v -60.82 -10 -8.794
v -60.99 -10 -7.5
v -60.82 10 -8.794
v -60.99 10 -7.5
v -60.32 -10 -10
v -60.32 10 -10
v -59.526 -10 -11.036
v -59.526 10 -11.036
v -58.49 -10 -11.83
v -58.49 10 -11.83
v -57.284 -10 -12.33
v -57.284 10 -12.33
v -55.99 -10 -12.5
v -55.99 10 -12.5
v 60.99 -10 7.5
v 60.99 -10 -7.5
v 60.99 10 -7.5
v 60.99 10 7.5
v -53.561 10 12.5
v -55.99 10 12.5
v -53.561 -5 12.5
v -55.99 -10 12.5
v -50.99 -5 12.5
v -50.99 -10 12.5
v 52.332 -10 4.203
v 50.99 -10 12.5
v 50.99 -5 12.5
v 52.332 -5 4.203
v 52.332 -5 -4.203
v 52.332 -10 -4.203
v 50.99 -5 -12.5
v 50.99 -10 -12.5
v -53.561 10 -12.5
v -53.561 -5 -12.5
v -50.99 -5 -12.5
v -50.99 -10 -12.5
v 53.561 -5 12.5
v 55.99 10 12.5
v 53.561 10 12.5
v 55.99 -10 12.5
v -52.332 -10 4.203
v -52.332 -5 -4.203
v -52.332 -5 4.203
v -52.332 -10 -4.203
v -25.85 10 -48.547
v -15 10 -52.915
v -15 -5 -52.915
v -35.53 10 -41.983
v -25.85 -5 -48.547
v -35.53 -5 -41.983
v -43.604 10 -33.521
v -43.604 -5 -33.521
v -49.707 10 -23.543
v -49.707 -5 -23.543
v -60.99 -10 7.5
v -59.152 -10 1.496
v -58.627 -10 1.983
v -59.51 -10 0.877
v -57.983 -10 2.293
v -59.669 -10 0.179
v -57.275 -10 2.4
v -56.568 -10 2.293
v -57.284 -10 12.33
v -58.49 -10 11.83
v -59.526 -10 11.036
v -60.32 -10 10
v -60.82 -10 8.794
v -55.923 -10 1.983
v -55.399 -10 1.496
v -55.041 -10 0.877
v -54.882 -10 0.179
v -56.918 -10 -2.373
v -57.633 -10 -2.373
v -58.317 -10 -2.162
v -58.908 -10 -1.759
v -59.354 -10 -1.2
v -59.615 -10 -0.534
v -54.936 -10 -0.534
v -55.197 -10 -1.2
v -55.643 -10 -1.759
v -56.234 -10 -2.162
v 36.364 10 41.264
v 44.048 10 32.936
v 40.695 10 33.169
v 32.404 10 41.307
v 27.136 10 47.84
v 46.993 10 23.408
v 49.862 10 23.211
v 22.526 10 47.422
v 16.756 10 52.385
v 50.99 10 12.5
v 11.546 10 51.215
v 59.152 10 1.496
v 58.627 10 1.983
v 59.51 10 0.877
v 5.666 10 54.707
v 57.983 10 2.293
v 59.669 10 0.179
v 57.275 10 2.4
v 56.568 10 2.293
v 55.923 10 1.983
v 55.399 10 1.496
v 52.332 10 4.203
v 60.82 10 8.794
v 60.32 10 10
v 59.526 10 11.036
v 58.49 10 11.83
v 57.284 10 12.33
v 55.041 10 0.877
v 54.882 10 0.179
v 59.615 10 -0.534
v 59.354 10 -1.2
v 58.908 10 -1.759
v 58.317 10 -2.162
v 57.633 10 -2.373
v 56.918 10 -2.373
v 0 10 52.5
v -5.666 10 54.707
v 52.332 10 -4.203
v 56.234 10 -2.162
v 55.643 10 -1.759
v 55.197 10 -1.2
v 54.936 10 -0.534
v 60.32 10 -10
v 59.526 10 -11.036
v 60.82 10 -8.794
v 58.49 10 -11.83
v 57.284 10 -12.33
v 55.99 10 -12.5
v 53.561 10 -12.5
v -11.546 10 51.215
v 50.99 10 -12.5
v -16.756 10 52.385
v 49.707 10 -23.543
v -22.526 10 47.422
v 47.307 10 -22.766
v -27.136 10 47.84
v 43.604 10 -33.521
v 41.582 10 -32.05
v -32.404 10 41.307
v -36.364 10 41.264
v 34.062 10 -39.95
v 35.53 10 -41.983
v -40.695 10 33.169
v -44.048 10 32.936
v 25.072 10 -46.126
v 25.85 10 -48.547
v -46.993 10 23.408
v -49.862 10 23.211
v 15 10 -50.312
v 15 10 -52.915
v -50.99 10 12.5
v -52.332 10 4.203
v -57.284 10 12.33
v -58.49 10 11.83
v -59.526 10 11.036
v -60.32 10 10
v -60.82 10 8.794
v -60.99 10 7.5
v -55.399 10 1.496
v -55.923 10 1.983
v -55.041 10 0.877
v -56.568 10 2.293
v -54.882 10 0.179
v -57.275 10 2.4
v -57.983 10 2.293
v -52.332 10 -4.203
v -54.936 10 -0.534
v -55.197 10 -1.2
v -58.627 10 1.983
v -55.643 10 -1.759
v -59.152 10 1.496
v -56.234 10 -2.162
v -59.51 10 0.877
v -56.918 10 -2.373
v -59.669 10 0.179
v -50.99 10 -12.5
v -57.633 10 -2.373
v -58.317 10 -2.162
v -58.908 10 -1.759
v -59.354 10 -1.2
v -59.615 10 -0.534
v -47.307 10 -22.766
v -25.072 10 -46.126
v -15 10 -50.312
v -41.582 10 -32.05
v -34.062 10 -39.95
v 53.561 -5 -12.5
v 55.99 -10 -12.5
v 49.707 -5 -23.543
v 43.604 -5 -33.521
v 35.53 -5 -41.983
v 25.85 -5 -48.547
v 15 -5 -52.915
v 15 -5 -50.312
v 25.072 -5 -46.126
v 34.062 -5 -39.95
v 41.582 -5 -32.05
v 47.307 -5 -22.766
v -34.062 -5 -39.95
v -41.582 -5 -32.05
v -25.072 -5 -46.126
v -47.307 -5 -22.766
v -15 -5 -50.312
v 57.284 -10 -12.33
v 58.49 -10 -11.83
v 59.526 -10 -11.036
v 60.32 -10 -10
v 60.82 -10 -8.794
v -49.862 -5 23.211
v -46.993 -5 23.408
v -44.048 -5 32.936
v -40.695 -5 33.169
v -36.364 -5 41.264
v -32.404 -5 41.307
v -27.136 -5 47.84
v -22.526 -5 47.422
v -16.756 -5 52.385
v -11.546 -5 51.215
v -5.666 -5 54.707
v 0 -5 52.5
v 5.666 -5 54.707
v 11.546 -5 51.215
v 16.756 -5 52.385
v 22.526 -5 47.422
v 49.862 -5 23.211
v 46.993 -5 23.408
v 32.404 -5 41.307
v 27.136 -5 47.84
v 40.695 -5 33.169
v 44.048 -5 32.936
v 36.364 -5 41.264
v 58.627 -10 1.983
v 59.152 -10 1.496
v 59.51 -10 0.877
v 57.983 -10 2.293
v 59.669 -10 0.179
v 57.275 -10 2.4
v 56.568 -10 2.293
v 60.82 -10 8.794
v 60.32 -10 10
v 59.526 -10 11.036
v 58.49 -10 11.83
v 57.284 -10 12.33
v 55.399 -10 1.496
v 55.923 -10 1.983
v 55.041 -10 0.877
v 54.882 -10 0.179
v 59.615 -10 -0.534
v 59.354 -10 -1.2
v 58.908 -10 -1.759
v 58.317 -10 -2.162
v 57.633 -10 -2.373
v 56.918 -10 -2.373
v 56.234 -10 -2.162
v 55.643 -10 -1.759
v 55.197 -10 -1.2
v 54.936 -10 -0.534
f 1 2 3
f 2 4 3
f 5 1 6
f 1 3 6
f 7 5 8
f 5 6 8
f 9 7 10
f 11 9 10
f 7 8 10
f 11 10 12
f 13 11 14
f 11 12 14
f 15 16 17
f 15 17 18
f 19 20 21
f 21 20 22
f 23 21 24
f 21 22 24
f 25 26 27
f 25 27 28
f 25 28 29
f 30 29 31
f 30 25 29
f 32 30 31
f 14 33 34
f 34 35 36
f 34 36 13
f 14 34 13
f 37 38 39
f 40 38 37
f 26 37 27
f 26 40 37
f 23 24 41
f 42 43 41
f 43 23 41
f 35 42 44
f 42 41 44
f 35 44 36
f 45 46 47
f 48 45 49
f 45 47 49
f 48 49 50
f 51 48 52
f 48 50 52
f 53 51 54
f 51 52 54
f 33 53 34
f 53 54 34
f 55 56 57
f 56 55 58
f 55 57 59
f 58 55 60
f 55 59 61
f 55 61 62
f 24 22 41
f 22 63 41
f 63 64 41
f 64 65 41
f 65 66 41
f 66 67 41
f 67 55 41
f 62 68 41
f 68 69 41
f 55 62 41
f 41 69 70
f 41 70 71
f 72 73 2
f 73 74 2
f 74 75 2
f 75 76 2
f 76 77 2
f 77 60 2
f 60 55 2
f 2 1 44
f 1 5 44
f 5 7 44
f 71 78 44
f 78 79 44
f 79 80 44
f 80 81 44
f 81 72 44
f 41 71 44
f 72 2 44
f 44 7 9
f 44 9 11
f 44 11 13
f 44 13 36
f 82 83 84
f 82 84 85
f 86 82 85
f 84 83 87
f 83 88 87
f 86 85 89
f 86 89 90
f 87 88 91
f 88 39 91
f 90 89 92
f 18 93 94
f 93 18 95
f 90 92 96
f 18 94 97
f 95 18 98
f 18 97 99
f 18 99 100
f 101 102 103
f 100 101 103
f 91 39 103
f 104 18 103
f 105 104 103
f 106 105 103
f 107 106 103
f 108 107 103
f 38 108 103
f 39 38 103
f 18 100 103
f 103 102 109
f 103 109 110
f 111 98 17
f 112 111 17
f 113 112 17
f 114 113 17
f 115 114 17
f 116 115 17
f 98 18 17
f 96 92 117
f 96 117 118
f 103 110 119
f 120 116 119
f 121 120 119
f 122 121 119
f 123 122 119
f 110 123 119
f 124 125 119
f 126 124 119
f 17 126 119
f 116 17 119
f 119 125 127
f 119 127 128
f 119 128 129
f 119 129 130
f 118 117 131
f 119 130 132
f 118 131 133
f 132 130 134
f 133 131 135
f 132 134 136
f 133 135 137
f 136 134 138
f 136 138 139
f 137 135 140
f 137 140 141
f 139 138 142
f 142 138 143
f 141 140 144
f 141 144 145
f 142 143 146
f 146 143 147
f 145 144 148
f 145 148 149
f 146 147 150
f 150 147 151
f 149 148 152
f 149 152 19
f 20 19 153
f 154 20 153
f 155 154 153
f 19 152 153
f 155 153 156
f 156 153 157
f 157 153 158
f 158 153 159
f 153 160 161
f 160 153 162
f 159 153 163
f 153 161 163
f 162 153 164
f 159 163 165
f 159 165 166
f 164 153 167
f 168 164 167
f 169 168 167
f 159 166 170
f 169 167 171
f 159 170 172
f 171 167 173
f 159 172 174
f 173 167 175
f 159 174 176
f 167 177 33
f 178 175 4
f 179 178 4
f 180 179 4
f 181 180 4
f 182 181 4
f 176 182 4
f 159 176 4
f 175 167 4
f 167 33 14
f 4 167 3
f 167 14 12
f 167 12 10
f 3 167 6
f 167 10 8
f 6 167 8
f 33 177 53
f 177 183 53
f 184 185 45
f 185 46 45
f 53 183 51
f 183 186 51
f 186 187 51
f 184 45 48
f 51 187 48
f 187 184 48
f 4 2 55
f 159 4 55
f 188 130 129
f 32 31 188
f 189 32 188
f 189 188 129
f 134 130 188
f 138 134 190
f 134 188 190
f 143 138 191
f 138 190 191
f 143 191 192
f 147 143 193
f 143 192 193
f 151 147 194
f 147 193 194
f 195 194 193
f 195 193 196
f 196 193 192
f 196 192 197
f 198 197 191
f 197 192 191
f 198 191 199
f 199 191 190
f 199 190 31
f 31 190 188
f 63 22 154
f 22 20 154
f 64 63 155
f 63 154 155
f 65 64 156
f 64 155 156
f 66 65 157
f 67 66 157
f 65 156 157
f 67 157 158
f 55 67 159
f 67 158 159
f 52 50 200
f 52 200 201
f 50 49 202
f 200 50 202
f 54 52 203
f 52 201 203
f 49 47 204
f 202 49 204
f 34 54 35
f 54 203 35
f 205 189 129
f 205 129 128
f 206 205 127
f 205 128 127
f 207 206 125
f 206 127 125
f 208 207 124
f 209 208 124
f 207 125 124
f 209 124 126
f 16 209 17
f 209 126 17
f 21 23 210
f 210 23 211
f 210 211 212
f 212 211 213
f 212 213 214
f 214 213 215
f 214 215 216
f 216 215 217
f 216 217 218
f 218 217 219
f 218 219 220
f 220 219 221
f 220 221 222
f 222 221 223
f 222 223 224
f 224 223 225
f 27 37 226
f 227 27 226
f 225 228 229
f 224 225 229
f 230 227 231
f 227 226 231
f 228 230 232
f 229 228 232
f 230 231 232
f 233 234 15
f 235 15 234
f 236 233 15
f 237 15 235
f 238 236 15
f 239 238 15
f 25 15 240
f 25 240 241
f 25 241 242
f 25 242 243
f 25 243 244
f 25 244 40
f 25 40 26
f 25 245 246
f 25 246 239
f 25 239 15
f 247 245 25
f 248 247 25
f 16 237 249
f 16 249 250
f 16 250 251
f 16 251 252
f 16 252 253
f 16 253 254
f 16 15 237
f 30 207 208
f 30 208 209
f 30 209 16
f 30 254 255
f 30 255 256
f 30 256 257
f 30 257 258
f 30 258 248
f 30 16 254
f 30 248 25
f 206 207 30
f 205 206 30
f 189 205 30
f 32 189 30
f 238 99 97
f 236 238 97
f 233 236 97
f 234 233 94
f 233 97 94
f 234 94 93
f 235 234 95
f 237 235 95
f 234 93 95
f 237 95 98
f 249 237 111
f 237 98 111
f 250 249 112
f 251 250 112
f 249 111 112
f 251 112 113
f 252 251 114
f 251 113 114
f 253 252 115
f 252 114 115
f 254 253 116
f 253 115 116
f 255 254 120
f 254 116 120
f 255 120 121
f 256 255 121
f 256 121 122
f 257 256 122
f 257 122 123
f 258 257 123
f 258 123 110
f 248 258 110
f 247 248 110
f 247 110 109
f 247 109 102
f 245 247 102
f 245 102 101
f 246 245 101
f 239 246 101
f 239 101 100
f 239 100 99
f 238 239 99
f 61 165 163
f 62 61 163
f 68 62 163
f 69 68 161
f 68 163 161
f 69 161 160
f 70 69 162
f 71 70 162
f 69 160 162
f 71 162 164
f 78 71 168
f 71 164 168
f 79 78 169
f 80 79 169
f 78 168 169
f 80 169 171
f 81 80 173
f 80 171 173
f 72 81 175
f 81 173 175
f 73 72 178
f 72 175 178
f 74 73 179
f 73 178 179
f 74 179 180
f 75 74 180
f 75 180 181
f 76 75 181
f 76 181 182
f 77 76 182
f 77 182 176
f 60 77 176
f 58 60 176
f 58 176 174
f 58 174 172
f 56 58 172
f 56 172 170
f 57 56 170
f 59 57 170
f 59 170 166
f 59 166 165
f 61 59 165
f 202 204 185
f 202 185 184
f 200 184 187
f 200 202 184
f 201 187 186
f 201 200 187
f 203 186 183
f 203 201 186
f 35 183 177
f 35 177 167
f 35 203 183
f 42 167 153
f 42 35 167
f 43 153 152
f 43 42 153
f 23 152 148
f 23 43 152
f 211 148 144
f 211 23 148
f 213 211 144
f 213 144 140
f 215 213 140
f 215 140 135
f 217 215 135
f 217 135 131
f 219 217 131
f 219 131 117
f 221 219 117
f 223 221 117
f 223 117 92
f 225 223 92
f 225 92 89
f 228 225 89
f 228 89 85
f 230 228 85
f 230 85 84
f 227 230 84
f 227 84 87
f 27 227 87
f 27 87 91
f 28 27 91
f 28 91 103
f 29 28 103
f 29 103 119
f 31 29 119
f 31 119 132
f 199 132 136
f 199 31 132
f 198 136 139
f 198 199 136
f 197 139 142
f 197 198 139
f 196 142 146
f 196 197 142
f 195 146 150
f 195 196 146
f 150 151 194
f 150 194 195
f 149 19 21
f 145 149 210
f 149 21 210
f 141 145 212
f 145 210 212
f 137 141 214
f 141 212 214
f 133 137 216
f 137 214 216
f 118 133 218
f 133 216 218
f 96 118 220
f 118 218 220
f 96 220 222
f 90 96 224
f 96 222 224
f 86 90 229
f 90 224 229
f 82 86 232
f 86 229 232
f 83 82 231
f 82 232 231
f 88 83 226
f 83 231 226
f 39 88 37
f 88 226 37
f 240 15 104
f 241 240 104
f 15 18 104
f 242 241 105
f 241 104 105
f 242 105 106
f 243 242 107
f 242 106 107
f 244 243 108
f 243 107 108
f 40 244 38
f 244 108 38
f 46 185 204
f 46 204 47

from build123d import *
from build123d.topology import SkipClean

# Parameters (mm, degrees)
BOSS_EXTRUDE1_DEPTH      = 10
BOSS_EXTRUDE1_DEPTH_BACK = 5
SKETCH1_R                = 55
SKETCH1_R_2              = 52.5
CUT_EXTRUDE2_DEPTH       = 80.214898
BOSS_EXTRUDE4_START      = -20
BOSS_EXTRUDE4_DEPTH      = 20
SKETCH7_R                = 2.4
CUT_EXTRUDE4_DEPTH       = 85.526942
FILLET1_R                = 5


with BuildPart() as part:
    # Sketch1 → Boss-Extrude1 (new, two sides: drawn at the far end of the back side and taken through both)
    with BuildSketch(Plane(origin=(0, 0, 0), x_dir=(1, 0, 0), z_dir=(0, 1, 0)).offset(-BOSS_EXTRUDE1_DEPTH_BACK)):
        Circle(SKETCH1_R)
        Circle(SKETCH1_R_2, mode=Mode.SUBTRACT)
    extrude(amount=BOSS_EXTRUDE1_DEPTH + BOSS_EXTRUDE1_DEPTH_BACK)

    # Sketch2 → Cut-Extrude2 (cut, through all)
    with BuildSketch(Plane(origin=(0, 10, 0), x_dir=(1, 0, 0), z_dir=(0, 1, 0))):
        Polygon((0, 0), (-15, 0), (-15, 70), (15, 70), (15, 0), align=None)
    extrude(amount=-CUT_EXTRUDE2_DEPTH, mode=Mode.SUBTRACT)

    # Sketch6 → Boss-Extrude4 (add)
    with SkipClean():  # the faces are left unmerged after this step: merging them gives an invalid solid
        with BuildSketch(Plane(origin=(0, 10, 0), x_dir=(1, 0, 0), z_dir=(0, 1, 0)).offset(BOSS_EXTRUDE4_START)):
            with BuildLine():
                Line((50.990195, 12.5), (60.990195, 12.5))
                Line((60.990195, 12.5), (60.990195, -12.5))
                Line((60.990195, -12.5), (50.990195, -12.5))
                ThreePointArc((50.990195, -12.5), (52.5, 0), (50.990195, 12.5))
            make_face()
            with BuildLine():
                Line((-60.990195, -12.5), (-50.990195, -12.5))
                ThreePointArc((-50.990195, -12.5), (-52.5, 0), (-50.990195, 12.5))
                Line((-50.990195, 12.5), (-60.990195, 12.5))
                Line((-60.990195, 12.5), (-60.990195, -12.5))
            make_face()
        extrude(amount=BOSS_EXTRUDE4_DEPTH)

    # Sketch7 → Cut-Extrude4 (cut, through all)
    with SkipClean():  # the faces are left unmerged after this step: merging them gives an invalid solid
        with BuildSketch(Plane(origin=(0, 10, 0), x_dir=(1, 0, 0), z_dir=(0, 1, 0))):
            with Locations((-57.275454, 0)):
                Circle(SKETCH7_R)
            with Locations((57.275454, 0)):
                Circle(SKETCH7_R)
        extrude(amount=-CUT_EXTRUDE4_DEPTH, mode=Mode.SUBTRACT)

    # Fillet1
    fillet1_edges = [part.edges().sort_by_distance(p)[0] for p in [
        (60.990195, 0, -12.5),
        (60.990195, 0, 12.5),
        (-60.990195, 0, 12.5),
        (-60.990195, 0, -12.5),
    ]]
    fillet(fillet1_edges, radius=FILLET1_R)


solid = part.part
